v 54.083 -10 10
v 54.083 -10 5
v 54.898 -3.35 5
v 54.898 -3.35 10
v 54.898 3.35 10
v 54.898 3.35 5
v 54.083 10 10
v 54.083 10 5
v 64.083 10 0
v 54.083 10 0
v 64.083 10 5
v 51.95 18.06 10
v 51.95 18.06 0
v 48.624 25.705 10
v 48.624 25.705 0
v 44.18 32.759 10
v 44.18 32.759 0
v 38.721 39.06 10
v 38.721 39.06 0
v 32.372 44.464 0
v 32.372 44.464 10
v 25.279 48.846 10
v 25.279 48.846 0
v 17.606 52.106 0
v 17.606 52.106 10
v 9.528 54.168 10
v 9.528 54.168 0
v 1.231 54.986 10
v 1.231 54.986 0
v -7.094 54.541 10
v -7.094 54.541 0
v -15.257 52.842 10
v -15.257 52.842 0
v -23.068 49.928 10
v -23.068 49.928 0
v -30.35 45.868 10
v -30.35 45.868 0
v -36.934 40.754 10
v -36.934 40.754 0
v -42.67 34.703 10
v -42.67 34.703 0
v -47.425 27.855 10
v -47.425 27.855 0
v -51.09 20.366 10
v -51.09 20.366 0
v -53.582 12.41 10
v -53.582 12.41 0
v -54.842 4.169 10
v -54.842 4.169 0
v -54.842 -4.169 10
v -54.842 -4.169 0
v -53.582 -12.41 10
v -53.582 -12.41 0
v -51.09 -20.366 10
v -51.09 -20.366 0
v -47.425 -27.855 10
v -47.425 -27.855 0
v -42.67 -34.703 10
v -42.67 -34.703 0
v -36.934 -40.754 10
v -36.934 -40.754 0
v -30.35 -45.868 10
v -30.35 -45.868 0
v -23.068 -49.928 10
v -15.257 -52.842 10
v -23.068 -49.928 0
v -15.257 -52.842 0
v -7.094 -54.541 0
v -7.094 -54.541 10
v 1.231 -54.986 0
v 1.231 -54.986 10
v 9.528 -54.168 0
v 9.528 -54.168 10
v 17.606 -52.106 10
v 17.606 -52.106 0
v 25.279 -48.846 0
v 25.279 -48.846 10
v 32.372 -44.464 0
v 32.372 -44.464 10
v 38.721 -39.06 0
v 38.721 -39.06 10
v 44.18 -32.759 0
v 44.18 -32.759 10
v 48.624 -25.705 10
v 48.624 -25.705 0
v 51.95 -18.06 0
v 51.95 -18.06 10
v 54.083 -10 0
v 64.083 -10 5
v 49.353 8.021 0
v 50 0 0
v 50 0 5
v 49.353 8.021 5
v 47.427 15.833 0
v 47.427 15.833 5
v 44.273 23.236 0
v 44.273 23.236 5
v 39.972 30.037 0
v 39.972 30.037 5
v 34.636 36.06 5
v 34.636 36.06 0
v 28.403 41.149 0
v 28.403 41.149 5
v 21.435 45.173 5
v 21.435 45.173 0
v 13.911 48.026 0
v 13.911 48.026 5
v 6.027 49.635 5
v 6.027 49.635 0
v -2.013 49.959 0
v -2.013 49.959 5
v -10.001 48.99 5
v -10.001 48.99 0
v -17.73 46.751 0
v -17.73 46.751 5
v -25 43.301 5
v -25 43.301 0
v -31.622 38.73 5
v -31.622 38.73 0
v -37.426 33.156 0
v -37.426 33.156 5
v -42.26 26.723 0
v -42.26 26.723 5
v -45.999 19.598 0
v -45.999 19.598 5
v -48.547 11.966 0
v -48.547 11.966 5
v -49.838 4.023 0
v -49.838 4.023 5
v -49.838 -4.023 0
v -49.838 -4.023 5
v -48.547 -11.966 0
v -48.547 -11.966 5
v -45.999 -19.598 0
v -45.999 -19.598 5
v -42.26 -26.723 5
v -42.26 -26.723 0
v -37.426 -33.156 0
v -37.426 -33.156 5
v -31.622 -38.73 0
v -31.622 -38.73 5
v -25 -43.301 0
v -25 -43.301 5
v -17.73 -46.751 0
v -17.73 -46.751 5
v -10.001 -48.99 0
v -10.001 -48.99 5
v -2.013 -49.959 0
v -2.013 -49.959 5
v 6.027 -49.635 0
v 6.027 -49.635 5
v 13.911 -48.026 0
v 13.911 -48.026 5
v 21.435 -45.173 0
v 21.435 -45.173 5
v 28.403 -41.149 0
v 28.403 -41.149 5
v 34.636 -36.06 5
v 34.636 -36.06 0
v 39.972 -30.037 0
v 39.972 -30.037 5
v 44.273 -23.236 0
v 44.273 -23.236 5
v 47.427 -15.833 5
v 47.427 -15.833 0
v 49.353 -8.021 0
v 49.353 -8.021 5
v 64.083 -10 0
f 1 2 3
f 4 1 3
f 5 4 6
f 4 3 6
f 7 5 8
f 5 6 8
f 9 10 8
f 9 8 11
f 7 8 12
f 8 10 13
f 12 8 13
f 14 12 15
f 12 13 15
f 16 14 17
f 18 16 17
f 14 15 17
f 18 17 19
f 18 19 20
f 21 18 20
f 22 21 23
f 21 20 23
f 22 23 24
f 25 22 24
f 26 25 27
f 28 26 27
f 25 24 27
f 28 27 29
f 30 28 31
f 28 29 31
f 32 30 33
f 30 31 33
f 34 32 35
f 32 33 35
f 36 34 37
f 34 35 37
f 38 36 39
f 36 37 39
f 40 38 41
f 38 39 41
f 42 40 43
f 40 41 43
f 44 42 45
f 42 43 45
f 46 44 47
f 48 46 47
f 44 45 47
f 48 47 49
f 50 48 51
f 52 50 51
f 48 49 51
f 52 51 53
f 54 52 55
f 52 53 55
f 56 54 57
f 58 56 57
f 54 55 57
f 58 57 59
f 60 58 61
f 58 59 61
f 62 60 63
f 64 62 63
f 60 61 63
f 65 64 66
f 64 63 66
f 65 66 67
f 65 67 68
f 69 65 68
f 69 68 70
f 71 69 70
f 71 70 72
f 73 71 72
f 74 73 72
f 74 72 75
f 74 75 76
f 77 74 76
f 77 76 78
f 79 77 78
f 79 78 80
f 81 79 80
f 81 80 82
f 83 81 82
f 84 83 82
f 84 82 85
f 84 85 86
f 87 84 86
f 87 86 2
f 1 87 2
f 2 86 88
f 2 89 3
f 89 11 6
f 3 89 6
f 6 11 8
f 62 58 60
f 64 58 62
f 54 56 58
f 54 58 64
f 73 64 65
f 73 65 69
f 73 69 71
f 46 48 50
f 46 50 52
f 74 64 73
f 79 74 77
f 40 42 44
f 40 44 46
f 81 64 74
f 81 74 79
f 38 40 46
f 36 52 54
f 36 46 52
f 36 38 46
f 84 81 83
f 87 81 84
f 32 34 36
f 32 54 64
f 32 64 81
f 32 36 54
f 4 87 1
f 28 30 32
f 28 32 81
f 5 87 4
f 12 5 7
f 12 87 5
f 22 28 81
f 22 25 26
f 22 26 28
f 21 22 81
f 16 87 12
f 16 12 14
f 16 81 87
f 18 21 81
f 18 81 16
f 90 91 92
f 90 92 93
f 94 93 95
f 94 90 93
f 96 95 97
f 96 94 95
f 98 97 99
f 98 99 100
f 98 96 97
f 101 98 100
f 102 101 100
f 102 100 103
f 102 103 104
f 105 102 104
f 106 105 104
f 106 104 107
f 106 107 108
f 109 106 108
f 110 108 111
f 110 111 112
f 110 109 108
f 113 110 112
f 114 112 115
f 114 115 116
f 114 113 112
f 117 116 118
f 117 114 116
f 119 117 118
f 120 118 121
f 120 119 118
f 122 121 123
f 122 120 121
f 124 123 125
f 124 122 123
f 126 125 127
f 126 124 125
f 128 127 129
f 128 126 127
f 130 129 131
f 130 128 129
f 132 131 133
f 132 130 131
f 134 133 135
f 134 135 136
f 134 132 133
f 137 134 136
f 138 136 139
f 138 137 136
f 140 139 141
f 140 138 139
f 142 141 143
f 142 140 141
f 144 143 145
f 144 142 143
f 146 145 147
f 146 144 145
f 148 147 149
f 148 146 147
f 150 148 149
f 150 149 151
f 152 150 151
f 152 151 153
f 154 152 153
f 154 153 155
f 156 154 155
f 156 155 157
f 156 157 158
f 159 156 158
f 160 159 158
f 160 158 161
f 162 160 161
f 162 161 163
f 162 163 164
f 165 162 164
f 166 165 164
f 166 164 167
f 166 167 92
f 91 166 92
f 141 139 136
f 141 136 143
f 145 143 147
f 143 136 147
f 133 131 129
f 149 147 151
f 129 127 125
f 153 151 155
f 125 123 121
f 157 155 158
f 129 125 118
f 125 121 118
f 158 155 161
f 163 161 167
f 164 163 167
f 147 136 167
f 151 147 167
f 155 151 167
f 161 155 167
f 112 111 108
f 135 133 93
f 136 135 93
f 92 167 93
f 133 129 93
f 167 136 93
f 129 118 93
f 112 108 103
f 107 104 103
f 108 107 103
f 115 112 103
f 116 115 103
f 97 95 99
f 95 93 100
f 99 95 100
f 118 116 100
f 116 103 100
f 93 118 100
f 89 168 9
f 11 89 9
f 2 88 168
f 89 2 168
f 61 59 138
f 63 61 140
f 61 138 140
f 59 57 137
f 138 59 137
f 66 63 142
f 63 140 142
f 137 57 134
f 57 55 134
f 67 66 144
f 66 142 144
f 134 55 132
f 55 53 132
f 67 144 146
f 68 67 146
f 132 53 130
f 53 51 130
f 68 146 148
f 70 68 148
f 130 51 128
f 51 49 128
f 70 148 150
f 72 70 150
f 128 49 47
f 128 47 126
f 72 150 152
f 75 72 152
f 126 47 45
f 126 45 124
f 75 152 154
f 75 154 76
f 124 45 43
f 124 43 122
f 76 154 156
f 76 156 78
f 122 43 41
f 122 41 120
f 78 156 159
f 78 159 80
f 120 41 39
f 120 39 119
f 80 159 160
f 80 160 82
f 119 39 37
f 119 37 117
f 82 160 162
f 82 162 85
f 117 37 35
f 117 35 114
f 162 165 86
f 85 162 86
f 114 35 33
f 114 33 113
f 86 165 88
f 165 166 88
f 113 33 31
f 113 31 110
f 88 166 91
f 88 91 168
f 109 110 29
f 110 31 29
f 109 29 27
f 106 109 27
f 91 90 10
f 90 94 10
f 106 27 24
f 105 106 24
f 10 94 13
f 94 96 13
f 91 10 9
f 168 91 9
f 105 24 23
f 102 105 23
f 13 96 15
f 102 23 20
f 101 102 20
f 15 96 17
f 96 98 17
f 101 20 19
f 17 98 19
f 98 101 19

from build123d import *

# Parameters (mm, degrees)
SKETCH_1_R          = 55
SKETCH_1_R_2        = 50
EXTRUDE_1_DEPTH     = 5
SKETCH_3_R          = 55
EXTRUDE_2_DEPTH     = 5
SKETCH_5_W          = 10
SKETCH_5_H          = 20
EXTRUDE_3_DEPTH     = 10
CUT_EXTRUDE_START   = -5
CUT_EXTRUDE_1_DEPTH = 5


with BuildPart() as part:
    # 스케치1 → 보스-돌출1 (new body)
    with BuildSketch(Plane.XY):
        Circle(SKETCH_1_R)
        Circle(SKETCH_1_R_2, mode=Mode.SUBTRACT)
    extrude(amount=EXTRUDE_1_DEPTH)

    # 스케치3 → 보스-돌출2 (add)
    with BuildSketch(Plane.XY.offset(5)):
        Circle(SKETCH_3_R)
    extrude(amount=EXTRUDE_2_DEPTH)

    # 스케치5 → 보스-돌출3 (add)
    with BuildSketch(Plane.XY):
        with Locations((59.083269132, 0)):
            Rectangle(SKETCH_5_W, SKETCH_5_H)
    extrude(amount=EXTRUDE_3_DEPTH)

    # 스케치6 → 컷-돌출1 (cut)
    with BuildSketch(Plane.XY.offset(10).offset(CUT_EXTRUDE_START)):
        with BuildLine():
            Line((54.083269132, 10), (64.083269132, 10))
            Line((64.083269132, 10), (64.083269132, -10))
            Line((64.083269132, -10), (54.083269132, -10))
            ThreePointArc((54.083269132, -10), (55, 0), (54.083269132, 10))
        make_face()
    extrude(amount=CUT_EXTRUDE_1_DEPTH, mode=Mode.SUBTRACT)


solid = part.part
